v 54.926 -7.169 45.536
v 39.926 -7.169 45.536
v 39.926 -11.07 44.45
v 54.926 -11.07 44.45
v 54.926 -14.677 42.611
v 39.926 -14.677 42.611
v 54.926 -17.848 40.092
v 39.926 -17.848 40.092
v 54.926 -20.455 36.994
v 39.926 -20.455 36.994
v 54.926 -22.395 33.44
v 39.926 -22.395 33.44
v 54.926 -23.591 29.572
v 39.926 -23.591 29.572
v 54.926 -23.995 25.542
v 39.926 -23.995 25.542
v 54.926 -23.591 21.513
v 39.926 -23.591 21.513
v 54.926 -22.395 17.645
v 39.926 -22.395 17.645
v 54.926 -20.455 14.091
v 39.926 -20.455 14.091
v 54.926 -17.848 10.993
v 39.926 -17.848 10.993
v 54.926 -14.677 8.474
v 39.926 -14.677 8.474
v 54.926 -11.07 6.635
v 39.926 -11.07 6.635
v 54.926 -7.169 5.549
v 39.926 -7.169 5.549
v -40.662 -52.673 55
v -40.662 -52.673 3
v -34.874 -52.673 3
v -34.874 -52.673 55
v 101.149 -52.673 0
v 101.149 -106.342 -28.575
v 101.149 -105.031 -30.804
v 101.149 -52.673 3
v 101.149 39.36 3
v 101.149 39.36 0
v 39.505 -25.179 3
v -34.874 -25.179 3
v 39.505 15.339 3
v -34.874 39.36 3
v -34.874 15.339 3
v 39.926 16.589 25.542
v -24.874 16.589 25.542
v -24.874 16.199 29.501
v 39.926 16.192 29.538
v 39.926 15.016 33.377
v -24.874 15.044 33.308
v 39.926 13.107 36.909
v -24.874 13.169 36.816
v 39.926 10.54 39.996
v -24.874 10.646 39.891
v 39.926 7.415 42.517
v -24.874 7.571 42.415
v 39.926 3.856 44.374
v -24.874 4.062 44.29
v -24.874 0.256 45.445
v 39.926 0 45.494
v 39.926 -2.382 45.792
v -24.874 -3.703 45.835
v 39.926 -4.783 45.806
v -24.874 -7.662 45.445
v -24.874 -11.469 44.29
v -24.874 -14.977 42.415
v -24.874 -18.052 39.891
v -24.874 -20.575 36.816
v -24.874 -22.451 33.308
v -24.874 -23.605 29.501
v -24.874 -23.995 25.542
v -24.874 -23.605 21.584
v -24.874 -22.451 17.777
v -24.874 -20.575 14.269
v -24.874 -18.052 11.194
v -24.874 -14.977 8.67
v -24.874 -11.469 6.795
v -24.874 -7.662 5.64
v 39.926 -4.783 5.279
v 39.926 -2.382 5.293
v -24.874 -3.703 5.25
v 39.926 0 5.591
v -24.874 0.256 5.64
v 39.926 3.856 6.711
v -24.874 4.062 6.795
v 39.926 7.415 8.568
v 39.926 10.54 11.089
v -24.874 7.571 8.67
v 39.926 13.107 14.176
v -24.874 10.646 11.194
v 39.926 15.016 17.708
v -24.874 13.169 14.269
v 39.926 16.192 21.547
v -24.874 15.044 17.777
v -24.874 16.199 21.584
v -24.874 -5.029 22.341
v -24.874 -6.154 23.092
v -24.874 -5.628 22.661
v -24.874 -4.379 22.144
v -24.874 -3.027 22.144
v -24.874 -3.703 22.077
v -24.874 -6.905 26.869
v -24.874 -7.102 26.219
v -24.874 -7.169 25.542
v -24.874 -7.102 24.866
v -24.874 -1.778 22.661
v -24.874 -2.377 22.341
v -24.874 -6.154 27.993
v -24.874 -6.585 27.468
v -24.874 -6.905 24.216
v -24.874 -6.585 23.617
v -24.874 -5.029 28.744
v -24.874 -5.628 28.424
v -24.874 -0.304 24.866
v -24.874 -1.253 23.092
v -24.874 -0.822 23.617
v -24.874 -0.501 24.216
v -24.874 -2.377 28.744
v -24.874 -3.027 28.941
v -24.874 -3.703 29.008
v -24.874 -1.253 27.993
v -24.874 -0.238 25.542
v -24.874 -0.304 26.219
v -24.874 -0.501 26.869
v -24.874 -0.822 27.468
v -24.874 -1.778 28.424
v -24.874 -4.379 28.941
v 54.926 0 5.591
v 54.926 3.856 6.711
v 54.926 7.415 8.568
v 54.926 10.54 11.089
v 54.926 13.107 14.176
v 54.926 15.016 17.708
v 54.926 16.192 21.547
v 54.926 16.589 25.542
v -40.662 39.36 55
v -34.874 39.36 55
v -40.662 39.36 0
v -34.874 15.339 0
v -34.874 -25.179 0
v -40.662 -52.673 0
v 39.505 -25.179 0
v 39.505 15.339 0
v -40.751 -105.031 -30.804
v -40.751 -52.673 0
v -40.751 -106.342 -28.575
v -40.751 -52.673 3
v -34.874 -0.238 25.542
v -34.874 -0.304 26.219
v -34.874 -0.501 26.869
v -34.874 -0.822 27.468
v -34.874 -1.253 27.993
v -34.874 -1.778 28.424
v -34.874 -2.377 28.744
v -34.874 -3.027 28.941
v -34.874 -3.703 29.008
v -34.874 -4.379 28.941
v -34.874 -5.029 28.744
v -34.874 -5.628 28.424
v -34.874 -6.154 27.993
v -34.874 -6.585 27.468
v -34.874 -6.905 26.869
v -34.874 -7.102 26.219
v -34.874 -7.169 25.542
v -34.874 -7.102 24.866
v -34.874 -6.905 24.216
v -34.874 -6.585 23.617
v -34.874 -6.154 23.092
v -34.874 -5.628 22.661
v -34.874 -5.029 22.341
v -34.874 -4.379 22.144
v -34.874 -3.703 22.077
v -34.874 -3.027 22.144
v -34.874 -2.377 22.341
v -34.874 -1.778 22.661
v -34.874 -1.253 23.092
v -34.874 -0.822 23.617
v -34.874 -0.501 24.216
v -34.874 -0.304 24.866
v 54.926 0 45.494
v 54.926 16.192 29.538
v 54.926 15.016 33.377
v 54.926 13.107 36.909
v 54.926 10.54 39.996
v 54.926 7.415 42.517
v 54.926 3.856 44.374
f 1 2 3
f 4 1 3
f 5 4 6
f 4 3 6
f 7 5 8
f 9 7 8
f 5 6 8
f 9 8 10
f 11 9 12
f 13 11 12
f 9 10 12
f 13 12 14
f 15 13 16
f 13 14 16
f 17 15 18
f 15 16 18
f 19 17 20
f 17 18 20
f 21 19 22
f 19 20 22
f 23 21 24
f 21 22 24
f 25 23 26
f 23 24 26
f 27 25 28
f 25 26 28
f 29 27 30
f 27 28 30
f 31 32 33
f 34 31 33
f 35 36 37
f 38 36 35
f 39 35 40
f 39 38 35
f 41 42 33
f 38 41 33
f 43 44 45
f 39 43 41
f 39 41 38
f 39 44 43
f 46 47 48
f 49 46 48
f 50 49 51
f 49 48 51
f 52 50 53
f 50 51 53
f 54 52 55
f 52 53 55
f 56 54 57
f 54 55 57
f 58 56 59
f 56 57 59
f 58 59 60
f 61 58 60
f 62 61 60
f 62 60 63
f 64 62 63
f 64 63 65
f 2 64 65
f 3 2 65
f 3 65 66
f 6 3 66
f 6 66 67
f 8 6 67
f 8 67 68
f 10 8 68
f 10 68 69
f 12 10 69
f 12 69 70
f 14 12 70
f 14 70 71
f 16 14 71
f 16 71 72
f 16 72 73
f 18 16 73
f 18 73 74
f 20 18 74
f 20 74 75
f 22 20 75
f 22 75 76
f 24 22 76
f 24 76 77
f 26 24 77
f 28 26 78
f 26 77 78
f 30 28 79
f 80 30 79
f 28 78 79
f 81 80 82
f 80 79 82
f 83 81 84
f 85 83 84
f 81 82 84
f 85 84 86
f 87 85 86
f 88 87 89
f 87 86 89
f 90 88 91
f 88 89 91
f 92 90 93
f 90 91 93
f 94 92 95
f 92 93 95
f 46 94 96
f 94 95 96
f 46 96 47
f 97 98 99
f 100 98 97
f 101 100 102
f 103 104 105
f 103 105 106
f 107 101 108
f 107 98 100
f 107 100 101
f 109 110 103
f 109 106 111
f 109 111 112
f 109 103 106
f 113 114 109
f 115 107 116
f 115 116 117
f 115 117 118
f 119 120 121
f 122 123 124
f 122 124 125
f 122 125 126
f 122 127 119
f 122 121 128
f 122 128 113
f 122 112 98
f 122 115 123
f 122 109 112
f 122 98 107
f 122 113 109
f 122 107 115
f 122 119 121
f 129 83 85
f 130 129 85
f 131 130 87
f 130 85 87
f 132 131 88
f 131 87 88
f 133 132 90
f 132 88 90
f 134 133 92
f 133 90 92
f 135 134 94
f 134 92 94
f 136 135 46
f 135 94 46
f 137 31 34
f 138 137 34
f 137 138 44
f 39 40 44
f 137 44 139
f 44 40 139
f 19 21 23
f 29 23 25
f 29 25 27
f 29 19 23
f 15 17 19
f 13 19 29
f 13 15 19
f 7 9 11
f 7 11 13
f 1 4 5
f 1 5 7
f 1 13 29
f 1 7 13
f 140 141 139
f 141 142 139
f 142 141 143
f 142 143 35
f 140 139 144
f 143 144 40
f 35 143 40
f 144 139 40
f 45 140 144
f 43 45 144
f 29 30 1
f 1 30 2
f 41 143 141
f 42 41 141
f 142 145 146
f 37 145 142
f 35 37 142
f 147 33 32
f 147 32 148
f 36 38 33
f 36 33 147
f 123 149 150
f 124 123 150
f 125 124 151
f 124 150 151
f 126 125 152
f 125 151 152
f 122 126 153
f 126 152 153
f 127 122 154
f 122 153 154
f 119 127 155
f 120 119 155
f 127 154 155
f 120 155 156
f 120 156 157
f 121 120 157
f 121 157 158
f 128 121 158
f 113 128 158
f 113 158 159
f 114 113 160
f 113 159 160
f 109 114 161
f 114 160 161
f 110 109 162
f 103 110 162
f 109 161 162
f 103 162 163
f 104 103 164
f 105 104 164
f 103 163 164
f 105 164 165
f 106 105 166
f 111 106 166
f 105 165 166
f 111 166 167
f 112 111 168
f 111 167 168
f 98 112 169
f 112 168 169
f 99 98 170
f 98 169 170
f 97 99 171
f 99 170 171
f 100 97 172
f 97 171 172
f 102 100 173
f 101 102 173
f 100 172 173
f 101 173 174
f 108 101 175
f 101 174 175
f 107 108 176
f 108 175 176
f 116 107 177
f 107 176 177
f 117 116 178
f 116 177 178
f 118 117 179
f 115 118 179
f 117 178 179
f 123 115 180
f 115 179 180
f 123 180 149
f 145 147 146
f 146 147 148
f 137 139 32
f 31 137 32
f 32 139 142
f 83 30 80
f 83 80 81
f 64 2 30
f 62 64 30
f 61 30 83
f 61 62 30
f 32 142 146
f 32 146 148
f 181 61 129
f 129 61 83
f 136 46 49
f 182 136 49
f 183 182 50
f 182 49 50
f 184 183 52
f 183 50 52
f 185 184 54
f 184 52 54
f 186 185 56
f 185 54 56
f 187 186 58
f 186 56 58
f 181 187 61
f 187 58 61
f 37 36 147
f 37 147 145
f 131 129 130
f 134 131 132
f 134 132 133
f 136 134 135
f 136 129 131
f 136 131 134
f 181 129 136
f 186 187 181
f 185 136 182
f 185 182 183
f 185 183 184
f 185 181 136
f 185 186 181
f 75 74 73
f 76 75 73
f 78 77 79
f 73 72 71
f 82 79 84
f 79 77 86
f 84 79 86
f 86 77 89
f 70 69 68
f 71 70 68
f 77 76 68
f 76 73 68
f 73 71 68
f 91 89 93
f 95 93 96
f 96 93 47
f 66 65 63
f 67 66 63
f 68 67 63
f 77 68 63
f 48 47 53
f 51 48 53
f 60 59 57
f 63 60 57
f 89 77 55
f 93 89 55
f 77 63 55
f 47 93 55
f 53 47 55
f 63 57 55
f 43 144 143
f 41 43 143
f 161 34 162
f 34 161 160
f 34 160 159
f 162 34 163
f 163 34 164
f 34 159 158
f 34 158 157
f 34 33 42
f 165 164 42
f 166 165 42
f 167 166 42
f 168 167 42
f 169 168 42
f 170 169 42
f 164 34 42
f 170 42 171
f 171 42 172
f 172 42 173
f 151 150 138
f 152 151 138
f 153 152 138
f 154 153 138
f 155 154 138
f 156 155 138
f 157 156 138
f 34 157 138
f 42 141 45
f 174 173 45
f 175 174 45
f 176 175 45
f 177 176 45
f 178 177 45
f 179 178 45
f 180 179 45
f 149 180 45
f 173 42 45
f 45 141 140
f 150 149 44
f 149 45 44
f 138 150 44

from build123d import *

# Parameters (mm, degrees)
F1_DEPTH  = 3
F2_DEPTH  = 55
F3_R      = 3.4654158046
F4_DEPTH  = 10
F6_DEPTH  = 141.9
F7_R      = 20.2920771374
F7_R_2    = 3.4654158046
F8_DEPTH  = 64.8
F10_DEPTH = 15


with BuildPart() as f1:
    # F0 (on Top) → F1 (new body)
    with BuildSketch(Plane.XY):
        Polygon((-34.8740294576, 39.3599048257), (-34.8740294576, 15.3387868777), (39.5046062768, 15.3387868777), (39.5046062768, -25.1787584275), (-34.8740294576, -25.1787584275), (-34.8740294576, -52.6728071272), (101.1491641402, -52.6728071272), (101.1491641402, 39.3599048257), align=None)
    extrude(amount=F1_DEPTH)

    # F0 (on Top) → F2 (join)
    with BuildSketch(Plane.XY):
        Polygon((-34.8740294576, -25.1787584275), (-34.8740294576, 15.3387868777), (-34.8740294576, 39.3599048257), (-40.6622514129, 39.3599048257), (-40.6622514129, -52.6728071272), (-34.8740294576, -52.6728071272), align=None)
    extrude(amount=F2_DEPTH)

    # F3 (on face) → F4 (join)
    with BuildSketch(Plane.YZ.offset(-34.8740294576)):
        with Locations((-3.7031148095, 25.5424808711)):
            Circle(F3_R)
    extrude(amount=F4_DEPTH)

    # F5 (on face) → F6 (join)
    with BuildSketch(Plane.YZ.offset(101.1491641402)):
        Polygon((-105.0309970103, -30.803521334), (-52.6728071272, 0), (-52.6728071272, 3), (-106.342145831, -28.5749001911), align=None)
    extrude(amount=-F6_DEPTH)


with BuildPart() as f8:
    # F7 (on face) → F8 (new body)
    with BuildSketch(Plane.YZ.offset(-24.8740294576)):
        with Locations((-3.7031148095, 25.5424808711)):
            Circle(F7_R)
        with Locations((-3.7031148095, 25.5424808711)):
            Circle(F7_R_2, mode=Mode.SUBTRACT)
        with Locations((-3.7031148095, 25.5424808711)):
            Circle(F7_R_2)
    extrude(amount=F8_DEPTH)

    # F9 (on face) → F10 (join)
    with BuildSketch(Plane.YZ.offset(39.9259705424)):
        with BuildLine():
            Line((-7.1687726304, 5.5485415289), (-7.1687726304, 45.5364202133))
            ThreePointArc((-7.1687726304, 45.5364202133), (-23.9951919469, 25.5424808711), (-7.1687726304, 5.5485415289))
        make_face()
        with BuildLine():
            ThreePointArc((16.5889623279, 25.5424808711), (11.8999663913, 38.5160020428), (0, 45.4938050191))
            Line((0, 45.4938050191), (0, 5.5911567231))
            ThreePointArc((0, 5.5911567231), (11.8999663913, 12.5689596993), (16.5889623279, 25.5424808711))
        make_face()
    extrude(amount=F10_DEPTH)


solid = Compound([f1.part, f8.part])
